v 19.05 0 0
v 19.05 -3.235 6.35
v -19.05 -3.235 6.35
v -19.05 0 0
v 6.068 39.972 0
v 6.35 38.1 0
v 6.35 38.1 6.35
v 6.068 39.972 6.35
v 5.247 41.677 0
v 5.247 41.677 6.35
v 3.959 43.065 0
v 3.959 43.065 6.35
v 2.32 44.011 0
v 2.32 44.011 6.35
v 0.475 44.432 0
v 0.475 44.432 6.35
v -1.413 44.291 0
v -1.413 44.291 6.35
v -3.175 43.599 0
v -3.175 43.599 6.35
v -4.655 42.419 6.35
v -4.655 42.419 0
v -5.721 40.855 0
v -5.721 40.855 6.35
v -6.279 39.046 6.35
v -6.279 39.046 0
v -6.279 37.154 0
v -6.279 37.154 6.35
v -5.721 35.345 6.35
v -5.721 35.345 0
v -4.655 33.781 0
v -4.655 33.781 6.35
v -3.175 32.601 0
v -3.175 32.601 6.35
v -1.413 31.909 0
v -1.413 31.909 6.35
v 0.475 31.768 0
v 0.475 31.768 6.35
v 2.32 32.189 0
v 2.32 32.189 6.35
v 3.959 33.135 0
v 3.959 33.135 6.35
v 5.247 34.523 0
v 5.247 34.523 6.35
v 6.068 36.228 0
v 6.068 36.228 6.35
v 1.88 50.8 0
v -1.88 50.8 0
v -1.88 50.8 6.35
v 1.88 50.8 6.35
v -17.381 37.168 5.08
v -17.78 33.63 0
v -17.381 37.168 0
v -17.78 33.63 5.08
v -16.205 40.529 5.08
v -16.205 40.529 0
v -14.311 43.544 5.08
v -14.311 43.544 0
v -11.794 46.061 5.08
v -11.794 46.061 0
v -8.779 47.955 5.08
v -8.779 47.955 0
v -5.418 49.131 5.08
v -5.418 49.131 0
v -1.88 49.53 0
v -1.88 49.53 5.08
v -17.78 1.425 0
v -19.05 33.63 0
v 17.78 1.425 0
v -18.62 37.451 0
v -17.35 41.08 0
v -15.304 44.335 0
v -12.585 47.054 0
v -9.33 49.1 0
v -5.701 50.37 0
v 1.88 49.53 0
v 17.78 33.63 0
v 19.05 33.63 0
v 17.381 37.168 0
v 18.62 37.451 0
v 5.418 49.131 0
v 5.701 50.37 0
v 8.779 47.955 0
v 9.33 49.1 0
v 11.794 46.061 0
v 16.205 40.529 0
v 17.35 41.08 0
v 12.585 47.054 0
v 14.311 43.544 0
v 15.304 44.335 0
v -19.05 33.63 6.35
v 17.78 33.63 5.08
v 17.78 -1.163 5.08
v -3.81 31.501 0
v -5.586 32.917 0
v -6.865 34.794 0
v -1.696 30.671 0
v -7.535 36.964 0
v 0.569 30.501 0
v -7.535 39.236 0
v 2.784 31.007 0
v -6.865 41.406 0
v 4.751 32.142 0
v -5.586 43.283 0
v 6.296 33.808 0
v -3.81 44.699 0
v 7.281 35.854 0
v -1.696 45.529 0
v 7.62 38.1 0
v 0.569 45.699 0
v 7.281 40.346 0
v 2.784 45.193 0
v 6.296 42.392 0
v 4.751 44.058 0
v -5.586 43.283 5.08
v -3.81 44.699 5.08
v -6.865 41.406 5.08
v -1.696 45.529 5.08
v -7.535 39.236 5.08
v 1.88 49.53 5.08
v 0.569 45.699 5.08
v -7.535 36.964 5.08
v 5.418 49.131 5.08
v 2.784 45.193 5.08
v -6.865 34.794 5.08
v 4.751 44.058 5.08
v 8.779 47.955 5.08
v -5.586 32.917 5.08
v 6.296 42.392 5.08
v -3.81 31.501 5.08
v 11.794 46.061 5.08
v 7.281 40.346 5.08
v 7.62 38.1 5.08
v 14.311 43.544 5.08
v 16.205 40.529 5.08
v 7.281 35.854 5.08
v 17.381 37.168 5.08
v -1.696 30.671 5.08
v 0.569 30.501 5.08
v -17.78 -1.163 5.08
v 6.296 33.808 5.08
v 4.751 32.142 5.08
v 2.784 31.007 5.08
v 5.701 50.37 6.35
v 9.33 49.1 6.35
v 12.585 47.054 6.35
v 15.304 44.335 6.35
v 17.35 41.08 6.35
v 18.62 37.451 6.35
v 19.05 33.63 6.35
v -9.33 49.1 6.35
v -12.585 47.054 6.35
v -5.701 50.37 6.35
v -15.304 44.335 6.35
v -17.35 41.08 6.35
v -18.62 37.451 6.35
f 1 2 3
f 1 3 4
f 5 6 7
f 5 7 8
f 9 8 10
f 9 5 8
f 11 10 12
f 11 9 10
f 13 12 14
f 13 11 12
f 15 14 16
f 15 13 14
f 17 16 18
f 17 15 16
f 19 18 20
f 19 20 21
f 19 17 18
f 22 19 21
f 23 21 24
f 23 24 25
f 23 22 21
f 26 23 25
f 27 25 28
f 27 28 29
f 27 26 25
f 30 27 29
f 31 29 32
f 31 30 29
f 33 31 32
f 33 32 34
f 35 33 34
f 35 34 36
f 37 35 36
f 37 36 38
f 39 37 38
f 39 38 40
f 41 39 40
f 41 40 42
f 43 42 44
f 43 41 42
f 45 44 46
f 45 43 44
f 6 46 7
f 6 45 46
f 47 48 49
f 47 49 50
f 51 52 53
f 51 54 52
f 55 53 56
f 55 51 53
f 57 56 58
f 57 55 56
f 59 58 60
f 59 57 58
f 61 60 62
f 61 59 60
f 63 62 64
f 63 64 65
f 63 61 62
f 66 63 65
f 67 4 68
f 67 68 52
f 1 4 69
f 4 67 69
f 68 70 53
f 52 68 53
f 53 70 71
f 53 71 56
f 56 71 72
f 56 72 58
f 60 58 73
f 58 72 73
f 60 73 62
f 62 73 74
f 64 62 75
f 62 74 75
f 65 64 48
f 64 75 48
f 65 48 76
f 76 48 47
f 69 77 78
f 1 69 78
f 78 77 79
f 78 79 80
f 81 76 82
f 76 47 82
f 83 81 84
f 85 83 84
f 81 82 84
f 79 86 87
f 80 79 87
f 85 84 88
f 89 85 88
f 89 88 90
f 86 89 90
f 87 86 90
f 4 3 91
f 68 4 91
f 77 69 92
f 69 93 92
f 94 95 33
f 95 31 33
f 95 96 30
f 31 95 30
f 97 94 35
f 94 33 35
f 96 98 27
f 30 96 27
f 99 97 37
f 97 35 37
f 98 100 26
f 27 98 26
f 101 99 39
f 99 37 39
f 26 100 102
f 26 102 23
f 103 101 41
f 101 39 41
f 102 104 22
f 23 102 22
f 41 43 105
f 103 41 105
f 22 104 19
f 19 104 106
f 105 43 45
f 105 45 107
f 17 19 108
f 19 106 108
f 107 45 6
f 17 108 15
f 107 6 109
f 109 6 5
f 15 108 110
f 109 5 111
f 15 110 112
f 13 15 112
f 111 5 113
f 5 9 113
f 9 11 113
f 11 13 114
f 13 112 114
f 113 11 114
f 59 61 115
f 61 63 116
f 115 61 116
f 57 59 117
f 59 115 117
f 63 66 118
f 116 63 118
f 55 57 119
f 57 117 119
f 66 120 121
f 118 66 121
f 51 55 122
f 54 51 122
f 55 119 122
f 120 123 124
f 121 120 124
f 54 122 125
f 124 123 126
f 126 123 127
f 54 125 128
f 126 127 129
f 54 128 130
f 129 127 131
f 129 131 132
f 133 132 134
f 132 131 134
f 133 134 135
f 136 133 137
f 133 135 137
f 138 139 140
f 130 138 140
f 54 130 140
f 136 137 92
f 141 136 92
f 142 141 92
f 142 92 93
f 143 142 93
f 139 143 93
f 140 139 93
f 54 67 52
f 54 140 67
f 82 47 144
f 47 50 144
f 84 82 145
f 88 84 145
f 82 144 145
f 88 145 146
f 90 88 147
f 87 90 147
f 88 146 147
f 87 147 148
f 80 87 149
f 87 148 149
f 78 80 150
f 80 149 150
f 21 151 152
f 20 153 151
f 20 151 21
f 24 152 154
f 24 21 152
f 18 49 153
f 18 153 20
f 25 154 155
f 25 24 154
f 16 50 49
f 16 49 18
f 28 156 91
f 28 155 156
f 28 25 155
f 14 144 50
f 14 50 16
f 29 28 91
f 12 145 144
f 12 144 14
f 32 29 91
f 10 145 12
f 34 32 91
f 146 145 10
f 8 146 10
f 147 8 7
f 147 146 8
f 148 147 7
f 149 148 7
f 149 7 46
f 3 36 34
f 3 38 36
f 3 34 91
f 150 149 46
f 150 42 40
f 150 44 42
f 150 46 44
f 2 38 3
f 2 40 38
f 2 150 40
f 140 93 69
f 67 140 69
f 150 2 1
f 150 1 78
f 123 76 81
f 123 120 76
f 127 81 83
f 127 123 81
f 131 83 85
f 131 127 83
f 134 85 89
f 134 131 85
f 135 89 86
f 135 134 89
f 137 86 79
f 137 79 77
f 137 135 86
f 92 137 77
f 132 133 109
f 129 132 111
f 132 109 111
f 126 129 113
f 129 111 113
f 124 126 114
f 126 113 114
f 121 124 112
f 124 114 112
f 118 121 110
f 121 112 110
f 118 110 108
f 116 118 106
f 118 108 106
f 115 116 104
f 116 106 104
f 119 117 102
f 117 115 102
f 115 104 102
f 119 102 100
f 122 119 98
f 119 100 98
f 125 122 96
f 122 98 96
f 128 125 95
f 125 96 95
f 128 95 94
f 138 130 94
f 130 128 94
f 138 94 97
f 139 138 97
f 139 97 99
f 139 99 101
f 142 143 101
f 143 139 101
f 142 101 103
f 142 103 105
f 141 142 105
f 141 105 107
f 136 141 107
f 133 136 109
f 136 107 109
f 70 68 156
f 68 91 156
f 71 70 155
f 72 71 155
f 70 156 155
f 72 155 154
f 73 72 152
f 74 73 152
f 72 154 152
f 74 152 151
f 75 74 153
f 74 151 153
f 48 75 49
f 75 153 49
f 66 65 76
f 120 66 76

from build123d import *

# Parameters (mm, degrees)
F0_W     = 38.1
F0_H     = 50.8
F0_R     = 6.35
F1_DEPTH = 6.35
F2_R     = 17.169887
F4_DEPTH = 38.1
F5_T     = -1.27


with BuildPart() as f1:
    # F0 (on Top) → F1 (new body)
    with BuildSketch(Plane.XY):
        with Locations((0, 25.4)):
            Rectangle(F0_W, F0_H)
        with Locations((0, 38.1)):
            Circle(F0_R, mode=Mode.SUBTRACT)
    extrude(amount=F1_DEPTH)

    # F2
    f2_edges = [f1.edges().sort_by_distance(p)[0] for p in [
        (-19.05, 50.8, 3.175),
        (19.05, 50.8, 3.175),
    ]]
    fillet(f2_edges, radius=F2_R)

    # F3 (on face) → F4 (join)
    with BuildSketch(Plane.YZ.offset(19.05)):
        Polygon((0, 0), (0, 6.35), (-3.235487, 6.35), align=None)
    extrude(amount=-F4_DEPTH)

    # F5
    f5_openings = [f1.faces().sort_by_distance(p)[0] for p in [
        (0, 22.821689, 0),
    ]]
    offset(amount=F5_T, openings=f5_openings)


solid = f1.part
